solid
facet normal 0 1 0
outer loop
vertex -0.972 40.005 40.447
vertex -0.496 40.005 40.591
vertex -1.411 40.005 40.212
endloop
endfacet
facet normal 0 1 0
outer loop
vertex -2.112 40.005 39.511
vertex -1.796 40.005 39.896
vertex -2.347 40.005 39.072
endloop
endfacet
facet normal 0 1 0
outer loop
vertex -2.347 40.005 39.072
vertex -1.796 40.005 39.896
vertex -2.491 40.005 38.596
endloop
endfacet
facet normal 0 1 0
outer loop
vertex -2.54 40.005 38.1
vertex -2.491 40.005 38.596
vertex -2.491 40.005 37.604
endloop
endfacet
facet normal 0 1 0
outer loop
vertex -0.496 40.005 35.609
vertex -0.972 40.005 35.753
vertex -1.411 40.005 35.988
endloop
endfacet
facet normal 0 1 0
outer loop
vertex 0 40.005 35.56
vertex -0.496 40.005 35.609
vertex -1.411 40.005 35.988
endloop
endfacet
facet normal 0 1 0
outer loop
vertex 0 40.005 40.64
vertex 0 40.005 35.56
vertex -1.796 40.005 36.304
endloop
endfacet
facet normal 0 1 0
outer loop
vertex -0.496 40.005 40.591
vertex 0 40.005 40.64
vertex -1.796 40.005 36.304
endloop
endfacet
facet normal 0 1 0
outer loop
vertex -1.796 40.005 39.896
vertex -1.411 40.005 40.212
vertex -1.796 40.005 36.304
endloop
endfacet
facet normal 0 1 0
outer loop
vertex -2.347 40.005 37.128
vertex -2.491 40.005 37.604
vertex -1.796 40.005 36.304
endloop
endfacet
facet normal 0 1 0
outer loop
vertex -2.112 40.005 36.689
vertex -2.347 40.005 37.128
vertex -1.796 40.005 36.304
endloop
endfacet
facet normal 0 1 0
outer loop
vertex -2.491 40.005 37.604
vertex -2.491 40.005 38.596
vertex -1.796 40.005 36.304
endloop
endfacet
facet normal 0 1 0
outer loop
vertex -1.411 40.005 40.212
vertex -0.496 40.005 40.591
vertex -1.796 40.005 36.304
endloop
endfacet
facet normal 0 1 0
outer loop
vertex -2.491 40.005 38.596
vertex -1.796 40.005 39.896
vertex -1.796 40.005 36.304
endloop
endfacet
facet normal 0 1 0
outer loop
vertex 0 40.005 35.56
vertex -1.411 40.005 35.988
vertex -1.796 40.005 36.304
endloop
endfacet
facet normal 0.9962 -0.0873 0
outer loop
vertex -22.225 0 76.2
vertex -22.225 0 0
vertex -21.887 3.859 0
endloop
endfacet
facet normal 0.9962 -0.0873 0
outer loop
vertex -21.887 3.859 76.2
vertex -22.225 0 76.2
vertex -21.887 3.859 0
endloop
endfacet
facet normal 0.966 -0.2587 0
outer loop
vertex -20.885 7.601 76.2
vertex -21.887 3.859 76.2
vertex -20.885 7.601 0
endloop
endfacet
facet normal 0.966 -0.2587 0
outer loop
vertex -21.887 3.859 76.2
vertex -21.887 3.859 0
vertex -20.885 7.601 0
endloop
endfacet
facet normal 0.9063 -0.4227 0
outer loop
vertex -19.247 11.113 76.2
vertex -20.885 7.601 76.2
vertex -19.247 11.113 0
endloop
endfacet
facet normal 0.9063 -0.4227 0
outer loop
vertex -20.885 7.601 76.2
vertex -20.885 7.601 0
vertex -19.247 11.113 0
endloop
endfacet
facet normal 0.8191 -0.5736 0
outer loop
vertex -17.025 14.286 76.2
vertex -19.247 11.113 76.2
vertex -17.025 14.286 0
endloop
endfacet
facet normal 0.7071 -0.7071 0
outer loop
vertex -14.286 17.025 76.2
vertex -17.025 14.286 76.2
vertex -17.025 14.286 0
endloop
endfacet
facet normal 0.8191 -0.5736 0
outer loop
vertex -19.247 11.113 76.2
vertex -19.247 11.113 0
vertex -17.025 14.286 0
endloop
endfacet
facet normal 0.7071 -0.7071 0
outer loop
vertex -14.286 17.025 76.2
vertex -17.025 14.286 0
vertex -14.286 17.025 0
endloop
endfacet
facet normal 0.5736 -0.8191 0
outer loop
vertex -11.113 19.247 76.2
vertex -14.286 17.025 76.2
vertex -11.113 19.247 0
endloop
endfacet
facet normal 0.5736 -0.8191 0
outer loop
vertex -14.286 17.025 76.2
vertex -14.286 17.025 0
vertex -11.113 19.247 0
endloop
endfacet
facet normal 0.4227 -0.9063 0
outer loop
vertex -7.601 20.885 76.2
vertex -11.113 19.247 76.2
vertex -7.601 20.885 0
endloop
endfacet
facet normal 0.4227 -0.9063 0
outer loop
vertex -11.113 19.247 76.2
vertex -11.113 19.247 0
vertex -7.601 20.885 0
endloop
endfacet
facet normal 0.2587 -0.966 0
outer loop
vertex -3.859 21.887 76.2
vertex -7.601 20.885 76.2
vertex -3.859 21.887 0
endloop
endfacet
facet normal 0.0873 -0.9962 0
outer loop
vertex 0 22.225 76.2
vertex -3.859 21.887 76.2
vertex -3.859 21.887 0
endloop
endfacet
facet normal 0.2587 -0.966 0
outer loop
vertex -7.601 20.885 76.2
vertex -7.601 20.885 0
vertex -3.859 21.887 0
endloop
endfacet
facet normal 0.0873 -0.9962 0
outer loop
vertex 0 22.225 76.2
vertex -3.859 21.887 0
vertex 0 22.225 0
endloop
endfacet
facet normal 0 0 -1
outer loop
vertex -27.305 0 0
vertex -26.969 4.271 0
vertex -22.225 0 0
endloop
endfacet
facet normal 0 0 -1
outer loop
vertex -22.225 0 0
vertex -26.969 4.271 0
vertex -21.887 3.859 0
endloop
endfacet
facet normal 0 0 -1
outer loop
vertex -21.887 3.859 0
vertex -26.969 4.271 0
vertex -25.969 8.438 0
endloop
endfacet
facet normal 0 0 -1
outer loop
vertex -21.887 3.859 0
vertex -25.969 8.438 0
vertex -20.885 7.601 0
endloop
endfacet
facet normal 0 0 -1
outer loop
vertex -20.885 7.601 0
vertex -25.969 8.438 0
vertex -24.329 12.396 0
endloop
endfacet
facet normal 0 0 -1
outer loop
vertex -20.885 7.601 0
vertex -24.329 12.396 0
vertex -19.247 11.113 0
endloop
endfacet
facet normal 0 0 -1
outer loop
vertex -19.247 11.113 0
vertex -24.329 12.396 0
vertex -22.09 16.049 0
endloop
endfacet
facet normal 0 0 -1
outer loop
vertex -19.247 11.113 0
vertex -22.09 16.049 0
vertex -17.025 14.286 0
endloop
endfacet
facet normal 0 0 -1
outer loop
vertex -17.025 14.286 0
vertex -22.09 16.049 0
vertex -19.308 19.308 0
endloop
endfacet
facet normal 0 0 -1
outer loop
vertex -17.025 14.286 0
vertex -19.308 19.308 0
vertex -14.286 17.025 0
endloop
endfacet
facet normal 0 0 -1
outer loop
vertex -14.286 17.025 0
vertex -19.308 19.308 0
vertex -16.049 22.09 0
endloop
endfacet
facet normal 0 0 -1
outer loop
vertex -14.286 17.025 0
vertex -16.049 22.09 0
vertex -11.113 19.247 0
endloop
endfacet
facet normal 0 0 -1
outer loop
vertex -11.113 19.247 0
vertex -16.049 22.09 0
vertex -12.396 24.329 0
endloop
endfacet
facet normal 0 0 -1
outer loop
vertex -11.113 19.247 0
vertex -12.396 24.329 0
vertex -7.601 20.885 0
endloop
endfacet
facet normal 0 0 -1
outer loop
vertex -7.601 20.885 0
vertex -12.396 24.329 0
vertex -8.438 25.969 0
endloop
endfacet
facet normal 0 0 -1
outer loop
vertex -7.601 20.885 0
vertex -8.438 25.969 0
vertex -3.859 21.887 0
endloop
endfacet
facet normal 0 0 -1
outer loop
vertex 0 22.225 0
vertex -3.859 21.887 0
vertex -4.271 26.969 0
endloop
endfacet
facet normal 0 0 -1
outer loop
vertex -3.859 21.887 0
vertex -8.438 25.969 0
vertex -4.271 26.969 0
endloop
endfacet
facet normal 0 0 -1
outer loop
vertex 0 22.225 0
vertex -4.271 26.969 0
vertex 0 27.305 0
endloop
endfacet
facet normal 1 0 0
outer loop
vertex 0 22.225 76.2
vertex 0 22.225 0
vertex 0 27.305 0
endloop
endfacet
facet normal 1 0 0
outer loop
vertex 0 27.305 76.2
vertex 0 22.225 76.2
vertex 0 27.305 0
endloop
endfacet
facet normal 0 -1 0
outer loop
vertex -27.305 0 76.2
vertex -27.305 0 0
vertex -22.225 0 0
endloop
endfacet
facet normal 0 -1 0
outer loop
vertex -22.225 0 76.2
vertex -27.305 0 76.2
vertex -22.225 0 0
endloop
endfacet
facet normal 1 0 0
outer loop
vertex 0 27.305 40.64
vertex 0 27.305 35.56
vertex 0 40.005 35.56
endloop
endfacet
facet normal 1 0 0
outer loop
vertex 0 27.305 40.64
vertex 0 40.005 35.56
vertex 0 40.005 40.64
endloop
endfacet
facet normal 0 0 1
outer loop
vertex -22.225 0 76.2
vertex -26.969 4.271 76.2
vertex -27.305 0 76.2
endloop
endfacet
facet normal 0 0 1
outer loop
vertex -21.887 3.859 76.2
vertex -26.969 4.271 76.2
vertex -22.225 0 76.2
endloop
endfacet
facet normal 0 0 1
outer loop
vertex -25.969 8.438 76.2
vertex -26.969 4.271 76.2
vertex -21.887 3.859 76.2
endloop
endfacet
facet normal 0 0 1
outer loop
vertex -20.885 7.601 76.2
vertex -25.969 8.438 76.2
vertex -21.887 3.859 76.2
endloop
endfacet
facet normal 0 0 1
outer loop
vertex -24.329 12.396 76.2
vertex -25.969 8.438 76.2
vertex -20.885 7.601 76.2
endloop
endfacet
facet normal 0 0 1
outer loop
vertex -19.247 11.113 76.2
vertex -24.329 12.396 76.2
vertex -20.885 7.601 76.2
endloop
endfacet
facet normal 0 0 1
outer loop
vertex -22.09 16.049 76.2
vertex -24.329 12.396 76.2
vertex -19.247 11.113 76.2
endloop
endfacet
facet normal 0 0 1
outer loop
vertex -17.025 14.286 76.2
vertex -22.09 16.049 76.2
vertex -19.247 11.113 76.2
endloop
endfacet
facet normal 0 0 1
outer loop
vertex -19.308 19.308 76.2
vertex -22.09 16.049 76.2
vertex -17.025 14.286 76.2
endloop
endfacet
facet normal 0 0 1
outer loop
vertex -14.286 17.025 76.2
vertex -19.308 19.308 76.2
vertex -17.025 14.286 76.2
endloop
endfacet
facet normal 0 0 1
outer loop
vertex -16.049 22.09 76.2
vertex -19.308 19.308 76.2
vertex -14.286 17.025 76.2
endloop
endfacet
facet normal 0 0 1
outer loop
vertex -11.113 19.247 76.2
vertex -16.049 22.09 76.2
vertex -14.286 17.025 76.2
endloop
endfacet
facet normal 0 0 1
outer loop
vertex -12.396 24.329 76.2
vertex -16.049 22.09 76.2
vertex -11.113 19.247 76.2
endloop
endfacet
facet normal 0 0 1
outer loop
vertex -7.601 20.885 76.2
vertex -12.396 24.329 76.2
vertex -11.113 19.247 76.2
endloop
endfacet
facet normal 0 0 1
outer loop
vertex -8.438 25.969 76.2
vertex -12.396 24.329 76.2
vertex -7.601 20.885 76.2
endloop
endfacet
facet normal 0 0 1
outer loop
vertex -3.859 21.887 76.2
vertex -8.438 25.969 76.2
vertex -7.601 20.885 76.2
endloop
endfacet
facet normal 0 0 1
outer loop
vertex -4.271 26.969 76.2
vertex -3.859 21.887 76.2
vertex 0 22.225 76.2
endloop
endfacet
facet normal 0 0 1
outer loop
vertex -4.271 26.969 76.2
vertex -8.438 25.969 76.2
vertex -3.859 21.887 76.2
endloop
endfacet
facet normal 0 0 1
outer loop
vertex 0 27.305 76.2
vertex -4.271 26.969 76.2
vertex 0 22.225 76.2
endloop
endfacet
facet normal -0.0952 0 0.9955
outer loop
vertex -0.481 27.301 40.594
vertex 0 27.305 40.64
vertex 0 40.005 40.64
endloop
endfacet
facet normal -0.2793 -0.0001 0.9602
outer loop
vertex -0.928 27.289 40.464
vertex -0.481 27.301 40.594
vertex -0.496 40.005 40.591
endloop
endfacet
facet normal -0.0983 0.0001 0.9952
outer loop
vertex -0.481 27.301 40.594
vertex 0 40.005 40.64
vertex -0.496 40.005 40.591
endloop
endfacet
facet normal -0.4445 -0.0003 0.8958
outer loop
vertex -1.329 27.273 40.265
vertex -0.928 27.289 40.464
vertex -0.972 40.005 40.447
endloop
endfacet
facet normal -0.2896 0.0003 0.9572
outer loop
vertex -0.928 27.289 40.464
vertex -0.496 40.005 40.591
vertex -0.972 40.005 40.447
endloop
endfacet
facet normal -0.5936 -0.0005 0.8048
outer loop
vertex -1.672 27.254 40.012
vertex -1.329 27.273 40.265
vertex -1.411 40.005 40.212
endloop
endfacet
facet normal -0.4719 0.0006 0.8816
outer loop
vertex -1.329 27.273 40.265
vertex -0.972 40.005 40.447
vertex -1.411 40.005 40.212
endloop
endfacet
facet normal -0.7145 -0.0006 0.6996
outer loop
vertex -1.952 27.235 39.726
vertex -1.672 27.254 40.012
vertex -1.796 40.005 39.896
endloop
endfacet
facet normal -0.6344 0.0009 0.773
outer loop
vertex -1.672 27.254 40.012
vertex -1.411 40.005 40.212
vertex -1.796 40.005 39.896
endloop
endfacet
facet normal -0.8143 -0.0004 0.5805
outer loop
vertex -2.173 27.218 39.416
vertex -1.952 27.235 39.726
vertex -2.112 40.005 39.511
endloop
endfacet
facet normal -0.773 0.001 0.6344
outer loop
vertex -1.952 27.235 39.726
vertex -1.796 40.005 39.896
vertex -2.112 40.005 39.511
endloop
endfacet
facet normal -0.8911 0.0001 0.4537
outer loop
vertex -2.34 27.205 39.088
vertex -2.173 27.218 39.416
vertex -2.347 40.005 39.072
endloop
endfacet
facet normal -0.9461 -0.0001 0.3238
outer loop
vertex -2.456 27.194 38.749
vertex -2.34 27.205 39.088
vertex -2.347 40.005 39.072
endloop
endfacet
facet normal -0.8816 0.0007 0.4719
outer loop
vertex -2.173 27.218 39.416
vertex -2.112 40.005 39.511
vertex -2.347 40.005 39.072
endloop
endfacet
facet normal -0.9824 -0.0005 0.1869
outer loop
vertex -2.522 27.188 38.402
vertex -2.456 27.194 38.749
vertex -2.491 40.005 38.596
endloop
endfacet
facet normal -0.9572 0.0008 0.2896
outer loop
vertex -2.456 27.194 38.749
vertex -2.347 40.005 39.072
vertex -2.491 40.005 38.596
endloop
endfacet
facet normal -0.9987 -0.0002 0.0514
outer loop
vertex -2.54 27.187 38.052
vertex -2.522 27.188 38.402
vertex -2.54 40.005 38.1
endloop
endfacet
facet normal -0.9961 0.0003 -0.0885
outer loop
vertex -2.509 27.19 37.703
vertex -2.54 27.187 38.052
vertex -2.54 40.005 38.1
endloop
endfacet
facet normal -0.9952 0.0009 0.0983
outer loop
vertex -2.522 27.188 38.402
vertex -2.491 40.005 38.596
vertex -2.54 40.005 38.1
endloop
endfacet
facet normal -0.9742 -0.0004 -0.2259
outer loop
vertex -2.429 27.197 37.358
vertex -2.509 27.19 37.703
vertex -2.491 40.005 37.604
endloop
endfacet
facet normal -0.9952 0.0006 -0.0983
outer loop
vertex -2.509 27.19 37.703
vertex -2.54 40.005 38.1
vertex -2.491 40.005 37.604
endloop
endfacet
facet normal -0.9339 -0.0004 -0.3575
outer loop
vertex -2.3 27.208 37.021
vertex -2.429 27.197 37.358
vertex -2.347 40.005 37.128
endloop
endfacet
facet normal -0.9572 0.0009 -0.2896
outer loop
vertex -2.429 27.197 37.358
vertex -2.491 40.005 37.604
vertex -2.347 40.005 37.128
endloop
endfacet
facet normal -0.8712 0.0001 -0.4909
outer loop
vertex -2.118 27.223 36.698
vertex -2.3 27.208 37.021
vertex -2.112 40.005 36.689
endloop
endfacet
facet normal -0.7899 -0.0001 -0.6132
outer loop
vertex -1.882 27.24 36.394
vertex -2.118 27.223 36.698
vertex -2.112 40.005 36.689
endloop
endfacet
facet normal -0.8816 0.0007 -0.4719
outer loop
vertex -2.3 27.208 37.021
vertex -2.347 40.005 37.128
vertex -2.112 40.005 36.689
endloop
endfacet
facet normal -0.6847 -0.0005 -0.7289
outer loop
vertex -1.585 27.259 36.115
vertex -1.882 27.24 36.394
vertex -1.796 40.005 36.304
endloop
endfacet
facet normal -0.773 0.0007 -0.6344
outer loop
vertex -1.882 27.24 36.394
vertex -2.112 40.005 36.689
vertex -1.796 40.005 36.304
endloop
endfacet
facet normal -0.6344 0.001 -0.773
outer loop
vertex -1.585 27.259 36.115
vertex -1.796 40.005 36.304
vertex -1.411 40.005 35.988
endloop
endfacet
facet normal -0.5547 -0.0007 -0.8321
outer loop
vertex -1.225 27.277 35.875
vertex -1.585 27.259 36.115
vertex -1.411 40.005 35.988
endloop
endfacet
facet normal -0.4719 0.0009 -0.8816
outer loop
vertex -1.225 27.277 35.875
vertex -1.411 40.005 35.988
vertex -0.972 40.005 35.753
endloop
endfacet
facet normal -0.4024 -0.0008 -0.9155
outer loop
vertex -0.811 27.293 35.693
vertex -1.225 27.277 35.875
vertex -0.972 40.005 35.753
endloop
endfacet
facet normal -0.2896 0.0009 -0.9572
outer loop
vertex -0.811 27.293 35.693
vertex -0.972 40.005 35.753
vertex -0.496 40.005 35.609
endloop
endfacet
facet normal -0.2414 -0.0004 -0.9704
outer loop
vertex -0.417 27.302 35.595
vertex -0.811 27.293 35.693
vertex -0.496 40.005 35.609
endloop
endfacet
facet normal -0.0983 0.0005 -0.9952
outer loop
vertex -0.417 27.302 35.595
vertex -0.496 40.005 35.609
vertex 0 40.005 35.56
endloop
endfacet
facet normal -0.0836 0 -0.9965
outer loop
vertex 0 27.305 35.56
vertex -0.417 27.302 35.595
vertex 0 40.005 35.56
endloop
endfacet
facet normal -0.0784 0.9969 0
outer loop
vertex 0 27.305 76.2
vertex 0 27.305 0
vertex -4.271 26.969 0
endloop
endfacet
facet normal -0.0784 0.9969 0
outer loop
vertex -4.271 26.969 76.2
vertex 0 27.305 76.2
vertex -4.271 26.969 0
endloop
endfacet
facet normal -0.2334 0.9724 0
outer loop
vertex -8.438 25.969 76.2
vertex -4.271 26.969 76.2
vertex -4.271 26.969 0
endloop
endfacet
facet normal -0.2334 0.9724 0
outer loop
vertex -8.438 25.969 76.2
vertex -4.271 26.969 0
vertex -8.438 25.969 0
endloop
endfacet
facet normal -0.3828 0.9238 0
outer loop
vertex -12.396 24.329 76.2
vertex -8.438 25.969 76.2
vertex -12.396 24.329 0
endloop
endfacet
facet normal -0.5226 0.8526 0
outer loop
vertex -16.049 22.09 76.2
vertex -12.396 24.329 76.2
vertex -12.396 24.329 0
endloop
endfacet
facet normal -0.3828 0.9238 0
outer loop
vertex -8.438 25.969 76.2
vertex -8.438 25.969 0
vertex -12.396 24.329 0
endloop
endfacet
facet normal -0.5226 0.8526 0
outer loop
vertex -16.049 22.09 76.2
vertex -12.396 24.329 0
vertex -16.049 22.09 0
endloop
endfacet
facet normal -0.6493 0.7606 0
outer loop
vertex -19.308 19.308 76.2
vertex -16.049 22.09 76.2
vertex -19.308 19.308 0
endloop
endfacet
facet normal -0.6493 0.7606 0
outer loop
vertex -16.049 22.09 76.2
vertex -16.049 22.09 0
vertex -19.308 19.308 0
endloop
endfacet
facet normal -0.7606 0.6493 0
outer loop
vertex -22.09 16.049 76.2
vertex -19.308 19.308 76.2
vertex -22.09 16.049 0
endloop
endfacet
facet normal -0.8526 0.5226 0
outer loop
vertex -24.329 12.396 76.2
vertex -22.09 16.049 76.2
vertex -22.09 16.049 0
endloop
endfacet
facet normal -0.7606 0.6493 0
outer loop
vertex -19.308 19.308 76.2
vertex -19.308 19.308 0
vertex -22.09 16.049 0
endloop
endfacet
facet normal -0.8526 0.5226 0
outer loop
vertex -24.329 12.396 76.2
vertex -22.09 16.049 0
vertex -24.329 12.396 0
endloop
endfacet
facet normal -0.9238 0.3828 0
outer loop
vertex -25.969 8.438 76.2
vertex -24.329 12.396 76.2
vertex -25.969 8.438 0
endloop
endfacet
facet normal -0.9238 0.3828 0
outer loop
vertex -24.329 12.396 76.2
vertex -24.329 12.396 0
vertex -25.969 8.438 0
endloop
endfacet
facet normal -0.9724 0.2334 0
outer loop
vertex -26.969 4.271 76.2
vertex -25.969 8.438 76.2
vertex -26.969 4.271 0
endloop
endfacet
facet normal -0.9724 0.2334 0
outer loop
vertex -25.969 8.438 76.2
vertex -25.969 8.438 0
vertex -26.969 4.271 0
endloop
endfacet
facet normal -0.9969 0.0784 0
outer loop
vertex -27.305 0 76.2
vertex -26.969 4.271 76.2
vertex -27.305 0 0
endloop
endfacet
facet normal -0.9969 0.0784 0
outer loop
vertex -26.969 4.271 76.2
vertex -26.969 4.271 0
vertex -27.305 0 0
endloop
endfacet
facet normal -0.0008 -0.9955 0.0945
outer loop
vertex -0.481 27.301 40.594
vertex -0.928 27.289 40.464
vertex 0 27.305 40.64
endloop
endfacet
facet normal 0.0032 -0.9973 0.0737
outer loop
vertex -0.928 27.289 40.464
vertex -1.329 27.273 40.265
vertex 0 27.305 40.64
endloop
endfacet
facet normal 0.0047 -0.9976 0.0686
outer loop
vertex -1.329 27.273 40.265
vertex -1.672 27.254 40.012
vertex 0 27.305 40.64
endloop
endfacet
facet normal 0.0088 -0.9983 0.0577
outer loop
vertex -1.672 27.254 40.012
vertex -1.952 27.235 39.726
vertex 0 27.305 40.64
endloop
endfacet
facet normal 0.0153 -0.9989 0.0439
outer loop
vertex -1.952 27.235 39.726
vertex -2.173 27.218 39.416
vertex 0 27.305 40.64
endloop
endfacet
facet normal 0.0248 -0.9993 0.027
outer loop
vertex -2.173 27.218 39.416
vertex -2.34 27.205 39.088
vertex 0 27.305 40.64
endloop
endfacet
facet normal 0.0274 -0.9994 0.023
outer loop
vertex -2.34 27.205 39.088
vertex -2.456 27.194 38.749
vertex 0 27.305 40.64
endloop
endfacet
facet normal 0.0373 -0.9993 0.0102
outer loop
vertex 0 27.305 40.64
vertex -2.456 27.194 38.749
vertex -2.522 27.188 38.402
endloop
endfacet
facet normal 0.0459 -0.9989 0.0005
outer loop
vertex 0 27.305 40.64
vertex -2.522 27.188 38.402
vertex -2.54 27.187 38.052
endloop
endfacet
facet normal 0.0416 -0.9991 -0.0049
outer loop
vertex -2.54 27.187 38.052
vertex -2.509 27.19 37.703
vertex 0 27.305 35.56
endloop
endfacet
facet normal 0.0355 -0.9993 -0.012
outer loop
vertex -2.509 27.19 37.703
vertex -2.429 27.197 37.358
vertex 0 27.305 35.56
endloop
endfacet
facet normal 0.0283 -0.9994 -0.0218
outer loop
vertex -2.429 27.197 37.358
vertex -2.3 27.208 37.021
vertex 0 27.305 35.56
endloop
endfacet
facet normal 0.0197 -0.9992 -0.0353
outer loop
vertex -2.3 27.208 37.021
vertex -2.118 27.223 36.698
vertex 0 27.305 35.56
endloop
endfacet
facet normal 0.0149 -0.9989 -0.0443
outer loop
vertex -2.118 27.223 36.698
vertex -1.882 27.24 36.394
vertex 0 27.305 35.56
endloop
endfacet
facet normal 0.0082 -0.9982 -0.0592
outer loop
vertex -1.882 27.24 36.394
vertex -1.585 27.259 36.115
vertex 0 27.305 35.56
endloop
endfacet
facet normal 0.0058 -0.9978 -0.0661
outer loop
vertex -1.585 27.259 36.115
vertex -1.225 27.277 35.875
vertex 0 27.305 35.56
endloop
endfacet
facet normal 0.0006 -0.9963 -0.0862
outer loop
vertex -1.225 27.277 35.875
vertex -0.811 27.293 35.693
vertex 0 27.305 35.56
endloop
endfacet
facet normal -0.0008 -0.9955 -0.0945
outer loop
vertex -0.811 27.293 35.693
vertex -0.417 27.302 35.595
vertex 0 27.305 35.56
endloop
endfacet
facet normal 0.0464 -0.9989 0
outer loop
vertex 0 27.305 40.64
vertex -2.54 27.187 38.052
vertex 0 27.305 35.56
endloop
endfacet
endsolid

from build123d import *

# Parameters (mm, degrees)
BOSS_EXTRUDE1_DEPTH                  = 76.2
BOSS_EXTRUDE2_DEPTH                  = 12.7
BOSS_EXTRUDE2_DIRECTION_2_REACH      = 87.426
BOSS_EXTRUDE2_DIRECTION_2_END_RADIUS = 27.305


with BuildPart() as part:
    # Sketch1 → Boss-Extrude1 (new body)
    with BuildSketch(Plane.XY):
        with BuildLine():
            Line((-27.305, 0), (-22.225, 0))
            ThreePointArc((-22.225, 0), (-15.715448212, 15.715448212), (0, 22.225))
            Line((0, 22.225), (0, 27.305))
            ThreePointArc((0, 27.305), (-19.30755066, 19.30755066), (-27.305, 0))
        make_face()
    extrude(amount=BOSS_EXTRUDE1_DEPTH)


with BuildPart() as body_2:
    # Sketch2 → Boss-Extrude2 (new body)
    with BuildSketch(Plane(origin=(0, 27.305, 0), x_dir=(1, 0, 0), z_dir=(0, 1, 0))):
        with BuildLine():
            Line((0, -35.56), (0, -40.64))
            ThreePointArc((0, -40.64), (-2.54, -38.1), (0, -35.56))
        make_face()
    extrude(amount=BOSS_EXTRUDE2_DEPTH)

    # Boss-Extrude2 direction 2: up to this cylinder (the profile starts outside it)
    boss_extrude2_direction_2_end = Plane(origin=(0, 0, 38.1), z_dir=(0, 0, -1)) * Cylinder(BOSS_EXTRUDE2_DIRECTION_2_END_RADIUS, 230.462, mode=Mode.PRIVATE)
    # Sketch2 → Boss-Extrude2 direction 2 (add, up to the surface)
    with BuildSketch(Plane(origin=(0, 27.305, 0), x_dir=(1, 0, 0), z_dir=(0, 1, 0)), mode=Mode.PRIVATE) as boss_extrude2_direction_2_sk1:
        with BuildLine():
            Line((0, -35.56), (0, -40.64))
            ThreePointArc((0, -40.64), (-2.54, -38.1), (0, -35.56))
        make_face()
    boss_extrude2_direction_2_tool1 = extrude(boss_extrude2_direction_2_sk1.sketch, amount=-BOSS_EXTRUDE2_DIRECTION_2_REACH, mode=Mode.PRIVATE) - boss_extrude2_direction_2_end
    add(boss_extrude2_direction_2_tool1.solids().sort_by_distance((-1.078009, 27.305, 38.1))[0])


solid = Compound([part.part, body_2.part])
